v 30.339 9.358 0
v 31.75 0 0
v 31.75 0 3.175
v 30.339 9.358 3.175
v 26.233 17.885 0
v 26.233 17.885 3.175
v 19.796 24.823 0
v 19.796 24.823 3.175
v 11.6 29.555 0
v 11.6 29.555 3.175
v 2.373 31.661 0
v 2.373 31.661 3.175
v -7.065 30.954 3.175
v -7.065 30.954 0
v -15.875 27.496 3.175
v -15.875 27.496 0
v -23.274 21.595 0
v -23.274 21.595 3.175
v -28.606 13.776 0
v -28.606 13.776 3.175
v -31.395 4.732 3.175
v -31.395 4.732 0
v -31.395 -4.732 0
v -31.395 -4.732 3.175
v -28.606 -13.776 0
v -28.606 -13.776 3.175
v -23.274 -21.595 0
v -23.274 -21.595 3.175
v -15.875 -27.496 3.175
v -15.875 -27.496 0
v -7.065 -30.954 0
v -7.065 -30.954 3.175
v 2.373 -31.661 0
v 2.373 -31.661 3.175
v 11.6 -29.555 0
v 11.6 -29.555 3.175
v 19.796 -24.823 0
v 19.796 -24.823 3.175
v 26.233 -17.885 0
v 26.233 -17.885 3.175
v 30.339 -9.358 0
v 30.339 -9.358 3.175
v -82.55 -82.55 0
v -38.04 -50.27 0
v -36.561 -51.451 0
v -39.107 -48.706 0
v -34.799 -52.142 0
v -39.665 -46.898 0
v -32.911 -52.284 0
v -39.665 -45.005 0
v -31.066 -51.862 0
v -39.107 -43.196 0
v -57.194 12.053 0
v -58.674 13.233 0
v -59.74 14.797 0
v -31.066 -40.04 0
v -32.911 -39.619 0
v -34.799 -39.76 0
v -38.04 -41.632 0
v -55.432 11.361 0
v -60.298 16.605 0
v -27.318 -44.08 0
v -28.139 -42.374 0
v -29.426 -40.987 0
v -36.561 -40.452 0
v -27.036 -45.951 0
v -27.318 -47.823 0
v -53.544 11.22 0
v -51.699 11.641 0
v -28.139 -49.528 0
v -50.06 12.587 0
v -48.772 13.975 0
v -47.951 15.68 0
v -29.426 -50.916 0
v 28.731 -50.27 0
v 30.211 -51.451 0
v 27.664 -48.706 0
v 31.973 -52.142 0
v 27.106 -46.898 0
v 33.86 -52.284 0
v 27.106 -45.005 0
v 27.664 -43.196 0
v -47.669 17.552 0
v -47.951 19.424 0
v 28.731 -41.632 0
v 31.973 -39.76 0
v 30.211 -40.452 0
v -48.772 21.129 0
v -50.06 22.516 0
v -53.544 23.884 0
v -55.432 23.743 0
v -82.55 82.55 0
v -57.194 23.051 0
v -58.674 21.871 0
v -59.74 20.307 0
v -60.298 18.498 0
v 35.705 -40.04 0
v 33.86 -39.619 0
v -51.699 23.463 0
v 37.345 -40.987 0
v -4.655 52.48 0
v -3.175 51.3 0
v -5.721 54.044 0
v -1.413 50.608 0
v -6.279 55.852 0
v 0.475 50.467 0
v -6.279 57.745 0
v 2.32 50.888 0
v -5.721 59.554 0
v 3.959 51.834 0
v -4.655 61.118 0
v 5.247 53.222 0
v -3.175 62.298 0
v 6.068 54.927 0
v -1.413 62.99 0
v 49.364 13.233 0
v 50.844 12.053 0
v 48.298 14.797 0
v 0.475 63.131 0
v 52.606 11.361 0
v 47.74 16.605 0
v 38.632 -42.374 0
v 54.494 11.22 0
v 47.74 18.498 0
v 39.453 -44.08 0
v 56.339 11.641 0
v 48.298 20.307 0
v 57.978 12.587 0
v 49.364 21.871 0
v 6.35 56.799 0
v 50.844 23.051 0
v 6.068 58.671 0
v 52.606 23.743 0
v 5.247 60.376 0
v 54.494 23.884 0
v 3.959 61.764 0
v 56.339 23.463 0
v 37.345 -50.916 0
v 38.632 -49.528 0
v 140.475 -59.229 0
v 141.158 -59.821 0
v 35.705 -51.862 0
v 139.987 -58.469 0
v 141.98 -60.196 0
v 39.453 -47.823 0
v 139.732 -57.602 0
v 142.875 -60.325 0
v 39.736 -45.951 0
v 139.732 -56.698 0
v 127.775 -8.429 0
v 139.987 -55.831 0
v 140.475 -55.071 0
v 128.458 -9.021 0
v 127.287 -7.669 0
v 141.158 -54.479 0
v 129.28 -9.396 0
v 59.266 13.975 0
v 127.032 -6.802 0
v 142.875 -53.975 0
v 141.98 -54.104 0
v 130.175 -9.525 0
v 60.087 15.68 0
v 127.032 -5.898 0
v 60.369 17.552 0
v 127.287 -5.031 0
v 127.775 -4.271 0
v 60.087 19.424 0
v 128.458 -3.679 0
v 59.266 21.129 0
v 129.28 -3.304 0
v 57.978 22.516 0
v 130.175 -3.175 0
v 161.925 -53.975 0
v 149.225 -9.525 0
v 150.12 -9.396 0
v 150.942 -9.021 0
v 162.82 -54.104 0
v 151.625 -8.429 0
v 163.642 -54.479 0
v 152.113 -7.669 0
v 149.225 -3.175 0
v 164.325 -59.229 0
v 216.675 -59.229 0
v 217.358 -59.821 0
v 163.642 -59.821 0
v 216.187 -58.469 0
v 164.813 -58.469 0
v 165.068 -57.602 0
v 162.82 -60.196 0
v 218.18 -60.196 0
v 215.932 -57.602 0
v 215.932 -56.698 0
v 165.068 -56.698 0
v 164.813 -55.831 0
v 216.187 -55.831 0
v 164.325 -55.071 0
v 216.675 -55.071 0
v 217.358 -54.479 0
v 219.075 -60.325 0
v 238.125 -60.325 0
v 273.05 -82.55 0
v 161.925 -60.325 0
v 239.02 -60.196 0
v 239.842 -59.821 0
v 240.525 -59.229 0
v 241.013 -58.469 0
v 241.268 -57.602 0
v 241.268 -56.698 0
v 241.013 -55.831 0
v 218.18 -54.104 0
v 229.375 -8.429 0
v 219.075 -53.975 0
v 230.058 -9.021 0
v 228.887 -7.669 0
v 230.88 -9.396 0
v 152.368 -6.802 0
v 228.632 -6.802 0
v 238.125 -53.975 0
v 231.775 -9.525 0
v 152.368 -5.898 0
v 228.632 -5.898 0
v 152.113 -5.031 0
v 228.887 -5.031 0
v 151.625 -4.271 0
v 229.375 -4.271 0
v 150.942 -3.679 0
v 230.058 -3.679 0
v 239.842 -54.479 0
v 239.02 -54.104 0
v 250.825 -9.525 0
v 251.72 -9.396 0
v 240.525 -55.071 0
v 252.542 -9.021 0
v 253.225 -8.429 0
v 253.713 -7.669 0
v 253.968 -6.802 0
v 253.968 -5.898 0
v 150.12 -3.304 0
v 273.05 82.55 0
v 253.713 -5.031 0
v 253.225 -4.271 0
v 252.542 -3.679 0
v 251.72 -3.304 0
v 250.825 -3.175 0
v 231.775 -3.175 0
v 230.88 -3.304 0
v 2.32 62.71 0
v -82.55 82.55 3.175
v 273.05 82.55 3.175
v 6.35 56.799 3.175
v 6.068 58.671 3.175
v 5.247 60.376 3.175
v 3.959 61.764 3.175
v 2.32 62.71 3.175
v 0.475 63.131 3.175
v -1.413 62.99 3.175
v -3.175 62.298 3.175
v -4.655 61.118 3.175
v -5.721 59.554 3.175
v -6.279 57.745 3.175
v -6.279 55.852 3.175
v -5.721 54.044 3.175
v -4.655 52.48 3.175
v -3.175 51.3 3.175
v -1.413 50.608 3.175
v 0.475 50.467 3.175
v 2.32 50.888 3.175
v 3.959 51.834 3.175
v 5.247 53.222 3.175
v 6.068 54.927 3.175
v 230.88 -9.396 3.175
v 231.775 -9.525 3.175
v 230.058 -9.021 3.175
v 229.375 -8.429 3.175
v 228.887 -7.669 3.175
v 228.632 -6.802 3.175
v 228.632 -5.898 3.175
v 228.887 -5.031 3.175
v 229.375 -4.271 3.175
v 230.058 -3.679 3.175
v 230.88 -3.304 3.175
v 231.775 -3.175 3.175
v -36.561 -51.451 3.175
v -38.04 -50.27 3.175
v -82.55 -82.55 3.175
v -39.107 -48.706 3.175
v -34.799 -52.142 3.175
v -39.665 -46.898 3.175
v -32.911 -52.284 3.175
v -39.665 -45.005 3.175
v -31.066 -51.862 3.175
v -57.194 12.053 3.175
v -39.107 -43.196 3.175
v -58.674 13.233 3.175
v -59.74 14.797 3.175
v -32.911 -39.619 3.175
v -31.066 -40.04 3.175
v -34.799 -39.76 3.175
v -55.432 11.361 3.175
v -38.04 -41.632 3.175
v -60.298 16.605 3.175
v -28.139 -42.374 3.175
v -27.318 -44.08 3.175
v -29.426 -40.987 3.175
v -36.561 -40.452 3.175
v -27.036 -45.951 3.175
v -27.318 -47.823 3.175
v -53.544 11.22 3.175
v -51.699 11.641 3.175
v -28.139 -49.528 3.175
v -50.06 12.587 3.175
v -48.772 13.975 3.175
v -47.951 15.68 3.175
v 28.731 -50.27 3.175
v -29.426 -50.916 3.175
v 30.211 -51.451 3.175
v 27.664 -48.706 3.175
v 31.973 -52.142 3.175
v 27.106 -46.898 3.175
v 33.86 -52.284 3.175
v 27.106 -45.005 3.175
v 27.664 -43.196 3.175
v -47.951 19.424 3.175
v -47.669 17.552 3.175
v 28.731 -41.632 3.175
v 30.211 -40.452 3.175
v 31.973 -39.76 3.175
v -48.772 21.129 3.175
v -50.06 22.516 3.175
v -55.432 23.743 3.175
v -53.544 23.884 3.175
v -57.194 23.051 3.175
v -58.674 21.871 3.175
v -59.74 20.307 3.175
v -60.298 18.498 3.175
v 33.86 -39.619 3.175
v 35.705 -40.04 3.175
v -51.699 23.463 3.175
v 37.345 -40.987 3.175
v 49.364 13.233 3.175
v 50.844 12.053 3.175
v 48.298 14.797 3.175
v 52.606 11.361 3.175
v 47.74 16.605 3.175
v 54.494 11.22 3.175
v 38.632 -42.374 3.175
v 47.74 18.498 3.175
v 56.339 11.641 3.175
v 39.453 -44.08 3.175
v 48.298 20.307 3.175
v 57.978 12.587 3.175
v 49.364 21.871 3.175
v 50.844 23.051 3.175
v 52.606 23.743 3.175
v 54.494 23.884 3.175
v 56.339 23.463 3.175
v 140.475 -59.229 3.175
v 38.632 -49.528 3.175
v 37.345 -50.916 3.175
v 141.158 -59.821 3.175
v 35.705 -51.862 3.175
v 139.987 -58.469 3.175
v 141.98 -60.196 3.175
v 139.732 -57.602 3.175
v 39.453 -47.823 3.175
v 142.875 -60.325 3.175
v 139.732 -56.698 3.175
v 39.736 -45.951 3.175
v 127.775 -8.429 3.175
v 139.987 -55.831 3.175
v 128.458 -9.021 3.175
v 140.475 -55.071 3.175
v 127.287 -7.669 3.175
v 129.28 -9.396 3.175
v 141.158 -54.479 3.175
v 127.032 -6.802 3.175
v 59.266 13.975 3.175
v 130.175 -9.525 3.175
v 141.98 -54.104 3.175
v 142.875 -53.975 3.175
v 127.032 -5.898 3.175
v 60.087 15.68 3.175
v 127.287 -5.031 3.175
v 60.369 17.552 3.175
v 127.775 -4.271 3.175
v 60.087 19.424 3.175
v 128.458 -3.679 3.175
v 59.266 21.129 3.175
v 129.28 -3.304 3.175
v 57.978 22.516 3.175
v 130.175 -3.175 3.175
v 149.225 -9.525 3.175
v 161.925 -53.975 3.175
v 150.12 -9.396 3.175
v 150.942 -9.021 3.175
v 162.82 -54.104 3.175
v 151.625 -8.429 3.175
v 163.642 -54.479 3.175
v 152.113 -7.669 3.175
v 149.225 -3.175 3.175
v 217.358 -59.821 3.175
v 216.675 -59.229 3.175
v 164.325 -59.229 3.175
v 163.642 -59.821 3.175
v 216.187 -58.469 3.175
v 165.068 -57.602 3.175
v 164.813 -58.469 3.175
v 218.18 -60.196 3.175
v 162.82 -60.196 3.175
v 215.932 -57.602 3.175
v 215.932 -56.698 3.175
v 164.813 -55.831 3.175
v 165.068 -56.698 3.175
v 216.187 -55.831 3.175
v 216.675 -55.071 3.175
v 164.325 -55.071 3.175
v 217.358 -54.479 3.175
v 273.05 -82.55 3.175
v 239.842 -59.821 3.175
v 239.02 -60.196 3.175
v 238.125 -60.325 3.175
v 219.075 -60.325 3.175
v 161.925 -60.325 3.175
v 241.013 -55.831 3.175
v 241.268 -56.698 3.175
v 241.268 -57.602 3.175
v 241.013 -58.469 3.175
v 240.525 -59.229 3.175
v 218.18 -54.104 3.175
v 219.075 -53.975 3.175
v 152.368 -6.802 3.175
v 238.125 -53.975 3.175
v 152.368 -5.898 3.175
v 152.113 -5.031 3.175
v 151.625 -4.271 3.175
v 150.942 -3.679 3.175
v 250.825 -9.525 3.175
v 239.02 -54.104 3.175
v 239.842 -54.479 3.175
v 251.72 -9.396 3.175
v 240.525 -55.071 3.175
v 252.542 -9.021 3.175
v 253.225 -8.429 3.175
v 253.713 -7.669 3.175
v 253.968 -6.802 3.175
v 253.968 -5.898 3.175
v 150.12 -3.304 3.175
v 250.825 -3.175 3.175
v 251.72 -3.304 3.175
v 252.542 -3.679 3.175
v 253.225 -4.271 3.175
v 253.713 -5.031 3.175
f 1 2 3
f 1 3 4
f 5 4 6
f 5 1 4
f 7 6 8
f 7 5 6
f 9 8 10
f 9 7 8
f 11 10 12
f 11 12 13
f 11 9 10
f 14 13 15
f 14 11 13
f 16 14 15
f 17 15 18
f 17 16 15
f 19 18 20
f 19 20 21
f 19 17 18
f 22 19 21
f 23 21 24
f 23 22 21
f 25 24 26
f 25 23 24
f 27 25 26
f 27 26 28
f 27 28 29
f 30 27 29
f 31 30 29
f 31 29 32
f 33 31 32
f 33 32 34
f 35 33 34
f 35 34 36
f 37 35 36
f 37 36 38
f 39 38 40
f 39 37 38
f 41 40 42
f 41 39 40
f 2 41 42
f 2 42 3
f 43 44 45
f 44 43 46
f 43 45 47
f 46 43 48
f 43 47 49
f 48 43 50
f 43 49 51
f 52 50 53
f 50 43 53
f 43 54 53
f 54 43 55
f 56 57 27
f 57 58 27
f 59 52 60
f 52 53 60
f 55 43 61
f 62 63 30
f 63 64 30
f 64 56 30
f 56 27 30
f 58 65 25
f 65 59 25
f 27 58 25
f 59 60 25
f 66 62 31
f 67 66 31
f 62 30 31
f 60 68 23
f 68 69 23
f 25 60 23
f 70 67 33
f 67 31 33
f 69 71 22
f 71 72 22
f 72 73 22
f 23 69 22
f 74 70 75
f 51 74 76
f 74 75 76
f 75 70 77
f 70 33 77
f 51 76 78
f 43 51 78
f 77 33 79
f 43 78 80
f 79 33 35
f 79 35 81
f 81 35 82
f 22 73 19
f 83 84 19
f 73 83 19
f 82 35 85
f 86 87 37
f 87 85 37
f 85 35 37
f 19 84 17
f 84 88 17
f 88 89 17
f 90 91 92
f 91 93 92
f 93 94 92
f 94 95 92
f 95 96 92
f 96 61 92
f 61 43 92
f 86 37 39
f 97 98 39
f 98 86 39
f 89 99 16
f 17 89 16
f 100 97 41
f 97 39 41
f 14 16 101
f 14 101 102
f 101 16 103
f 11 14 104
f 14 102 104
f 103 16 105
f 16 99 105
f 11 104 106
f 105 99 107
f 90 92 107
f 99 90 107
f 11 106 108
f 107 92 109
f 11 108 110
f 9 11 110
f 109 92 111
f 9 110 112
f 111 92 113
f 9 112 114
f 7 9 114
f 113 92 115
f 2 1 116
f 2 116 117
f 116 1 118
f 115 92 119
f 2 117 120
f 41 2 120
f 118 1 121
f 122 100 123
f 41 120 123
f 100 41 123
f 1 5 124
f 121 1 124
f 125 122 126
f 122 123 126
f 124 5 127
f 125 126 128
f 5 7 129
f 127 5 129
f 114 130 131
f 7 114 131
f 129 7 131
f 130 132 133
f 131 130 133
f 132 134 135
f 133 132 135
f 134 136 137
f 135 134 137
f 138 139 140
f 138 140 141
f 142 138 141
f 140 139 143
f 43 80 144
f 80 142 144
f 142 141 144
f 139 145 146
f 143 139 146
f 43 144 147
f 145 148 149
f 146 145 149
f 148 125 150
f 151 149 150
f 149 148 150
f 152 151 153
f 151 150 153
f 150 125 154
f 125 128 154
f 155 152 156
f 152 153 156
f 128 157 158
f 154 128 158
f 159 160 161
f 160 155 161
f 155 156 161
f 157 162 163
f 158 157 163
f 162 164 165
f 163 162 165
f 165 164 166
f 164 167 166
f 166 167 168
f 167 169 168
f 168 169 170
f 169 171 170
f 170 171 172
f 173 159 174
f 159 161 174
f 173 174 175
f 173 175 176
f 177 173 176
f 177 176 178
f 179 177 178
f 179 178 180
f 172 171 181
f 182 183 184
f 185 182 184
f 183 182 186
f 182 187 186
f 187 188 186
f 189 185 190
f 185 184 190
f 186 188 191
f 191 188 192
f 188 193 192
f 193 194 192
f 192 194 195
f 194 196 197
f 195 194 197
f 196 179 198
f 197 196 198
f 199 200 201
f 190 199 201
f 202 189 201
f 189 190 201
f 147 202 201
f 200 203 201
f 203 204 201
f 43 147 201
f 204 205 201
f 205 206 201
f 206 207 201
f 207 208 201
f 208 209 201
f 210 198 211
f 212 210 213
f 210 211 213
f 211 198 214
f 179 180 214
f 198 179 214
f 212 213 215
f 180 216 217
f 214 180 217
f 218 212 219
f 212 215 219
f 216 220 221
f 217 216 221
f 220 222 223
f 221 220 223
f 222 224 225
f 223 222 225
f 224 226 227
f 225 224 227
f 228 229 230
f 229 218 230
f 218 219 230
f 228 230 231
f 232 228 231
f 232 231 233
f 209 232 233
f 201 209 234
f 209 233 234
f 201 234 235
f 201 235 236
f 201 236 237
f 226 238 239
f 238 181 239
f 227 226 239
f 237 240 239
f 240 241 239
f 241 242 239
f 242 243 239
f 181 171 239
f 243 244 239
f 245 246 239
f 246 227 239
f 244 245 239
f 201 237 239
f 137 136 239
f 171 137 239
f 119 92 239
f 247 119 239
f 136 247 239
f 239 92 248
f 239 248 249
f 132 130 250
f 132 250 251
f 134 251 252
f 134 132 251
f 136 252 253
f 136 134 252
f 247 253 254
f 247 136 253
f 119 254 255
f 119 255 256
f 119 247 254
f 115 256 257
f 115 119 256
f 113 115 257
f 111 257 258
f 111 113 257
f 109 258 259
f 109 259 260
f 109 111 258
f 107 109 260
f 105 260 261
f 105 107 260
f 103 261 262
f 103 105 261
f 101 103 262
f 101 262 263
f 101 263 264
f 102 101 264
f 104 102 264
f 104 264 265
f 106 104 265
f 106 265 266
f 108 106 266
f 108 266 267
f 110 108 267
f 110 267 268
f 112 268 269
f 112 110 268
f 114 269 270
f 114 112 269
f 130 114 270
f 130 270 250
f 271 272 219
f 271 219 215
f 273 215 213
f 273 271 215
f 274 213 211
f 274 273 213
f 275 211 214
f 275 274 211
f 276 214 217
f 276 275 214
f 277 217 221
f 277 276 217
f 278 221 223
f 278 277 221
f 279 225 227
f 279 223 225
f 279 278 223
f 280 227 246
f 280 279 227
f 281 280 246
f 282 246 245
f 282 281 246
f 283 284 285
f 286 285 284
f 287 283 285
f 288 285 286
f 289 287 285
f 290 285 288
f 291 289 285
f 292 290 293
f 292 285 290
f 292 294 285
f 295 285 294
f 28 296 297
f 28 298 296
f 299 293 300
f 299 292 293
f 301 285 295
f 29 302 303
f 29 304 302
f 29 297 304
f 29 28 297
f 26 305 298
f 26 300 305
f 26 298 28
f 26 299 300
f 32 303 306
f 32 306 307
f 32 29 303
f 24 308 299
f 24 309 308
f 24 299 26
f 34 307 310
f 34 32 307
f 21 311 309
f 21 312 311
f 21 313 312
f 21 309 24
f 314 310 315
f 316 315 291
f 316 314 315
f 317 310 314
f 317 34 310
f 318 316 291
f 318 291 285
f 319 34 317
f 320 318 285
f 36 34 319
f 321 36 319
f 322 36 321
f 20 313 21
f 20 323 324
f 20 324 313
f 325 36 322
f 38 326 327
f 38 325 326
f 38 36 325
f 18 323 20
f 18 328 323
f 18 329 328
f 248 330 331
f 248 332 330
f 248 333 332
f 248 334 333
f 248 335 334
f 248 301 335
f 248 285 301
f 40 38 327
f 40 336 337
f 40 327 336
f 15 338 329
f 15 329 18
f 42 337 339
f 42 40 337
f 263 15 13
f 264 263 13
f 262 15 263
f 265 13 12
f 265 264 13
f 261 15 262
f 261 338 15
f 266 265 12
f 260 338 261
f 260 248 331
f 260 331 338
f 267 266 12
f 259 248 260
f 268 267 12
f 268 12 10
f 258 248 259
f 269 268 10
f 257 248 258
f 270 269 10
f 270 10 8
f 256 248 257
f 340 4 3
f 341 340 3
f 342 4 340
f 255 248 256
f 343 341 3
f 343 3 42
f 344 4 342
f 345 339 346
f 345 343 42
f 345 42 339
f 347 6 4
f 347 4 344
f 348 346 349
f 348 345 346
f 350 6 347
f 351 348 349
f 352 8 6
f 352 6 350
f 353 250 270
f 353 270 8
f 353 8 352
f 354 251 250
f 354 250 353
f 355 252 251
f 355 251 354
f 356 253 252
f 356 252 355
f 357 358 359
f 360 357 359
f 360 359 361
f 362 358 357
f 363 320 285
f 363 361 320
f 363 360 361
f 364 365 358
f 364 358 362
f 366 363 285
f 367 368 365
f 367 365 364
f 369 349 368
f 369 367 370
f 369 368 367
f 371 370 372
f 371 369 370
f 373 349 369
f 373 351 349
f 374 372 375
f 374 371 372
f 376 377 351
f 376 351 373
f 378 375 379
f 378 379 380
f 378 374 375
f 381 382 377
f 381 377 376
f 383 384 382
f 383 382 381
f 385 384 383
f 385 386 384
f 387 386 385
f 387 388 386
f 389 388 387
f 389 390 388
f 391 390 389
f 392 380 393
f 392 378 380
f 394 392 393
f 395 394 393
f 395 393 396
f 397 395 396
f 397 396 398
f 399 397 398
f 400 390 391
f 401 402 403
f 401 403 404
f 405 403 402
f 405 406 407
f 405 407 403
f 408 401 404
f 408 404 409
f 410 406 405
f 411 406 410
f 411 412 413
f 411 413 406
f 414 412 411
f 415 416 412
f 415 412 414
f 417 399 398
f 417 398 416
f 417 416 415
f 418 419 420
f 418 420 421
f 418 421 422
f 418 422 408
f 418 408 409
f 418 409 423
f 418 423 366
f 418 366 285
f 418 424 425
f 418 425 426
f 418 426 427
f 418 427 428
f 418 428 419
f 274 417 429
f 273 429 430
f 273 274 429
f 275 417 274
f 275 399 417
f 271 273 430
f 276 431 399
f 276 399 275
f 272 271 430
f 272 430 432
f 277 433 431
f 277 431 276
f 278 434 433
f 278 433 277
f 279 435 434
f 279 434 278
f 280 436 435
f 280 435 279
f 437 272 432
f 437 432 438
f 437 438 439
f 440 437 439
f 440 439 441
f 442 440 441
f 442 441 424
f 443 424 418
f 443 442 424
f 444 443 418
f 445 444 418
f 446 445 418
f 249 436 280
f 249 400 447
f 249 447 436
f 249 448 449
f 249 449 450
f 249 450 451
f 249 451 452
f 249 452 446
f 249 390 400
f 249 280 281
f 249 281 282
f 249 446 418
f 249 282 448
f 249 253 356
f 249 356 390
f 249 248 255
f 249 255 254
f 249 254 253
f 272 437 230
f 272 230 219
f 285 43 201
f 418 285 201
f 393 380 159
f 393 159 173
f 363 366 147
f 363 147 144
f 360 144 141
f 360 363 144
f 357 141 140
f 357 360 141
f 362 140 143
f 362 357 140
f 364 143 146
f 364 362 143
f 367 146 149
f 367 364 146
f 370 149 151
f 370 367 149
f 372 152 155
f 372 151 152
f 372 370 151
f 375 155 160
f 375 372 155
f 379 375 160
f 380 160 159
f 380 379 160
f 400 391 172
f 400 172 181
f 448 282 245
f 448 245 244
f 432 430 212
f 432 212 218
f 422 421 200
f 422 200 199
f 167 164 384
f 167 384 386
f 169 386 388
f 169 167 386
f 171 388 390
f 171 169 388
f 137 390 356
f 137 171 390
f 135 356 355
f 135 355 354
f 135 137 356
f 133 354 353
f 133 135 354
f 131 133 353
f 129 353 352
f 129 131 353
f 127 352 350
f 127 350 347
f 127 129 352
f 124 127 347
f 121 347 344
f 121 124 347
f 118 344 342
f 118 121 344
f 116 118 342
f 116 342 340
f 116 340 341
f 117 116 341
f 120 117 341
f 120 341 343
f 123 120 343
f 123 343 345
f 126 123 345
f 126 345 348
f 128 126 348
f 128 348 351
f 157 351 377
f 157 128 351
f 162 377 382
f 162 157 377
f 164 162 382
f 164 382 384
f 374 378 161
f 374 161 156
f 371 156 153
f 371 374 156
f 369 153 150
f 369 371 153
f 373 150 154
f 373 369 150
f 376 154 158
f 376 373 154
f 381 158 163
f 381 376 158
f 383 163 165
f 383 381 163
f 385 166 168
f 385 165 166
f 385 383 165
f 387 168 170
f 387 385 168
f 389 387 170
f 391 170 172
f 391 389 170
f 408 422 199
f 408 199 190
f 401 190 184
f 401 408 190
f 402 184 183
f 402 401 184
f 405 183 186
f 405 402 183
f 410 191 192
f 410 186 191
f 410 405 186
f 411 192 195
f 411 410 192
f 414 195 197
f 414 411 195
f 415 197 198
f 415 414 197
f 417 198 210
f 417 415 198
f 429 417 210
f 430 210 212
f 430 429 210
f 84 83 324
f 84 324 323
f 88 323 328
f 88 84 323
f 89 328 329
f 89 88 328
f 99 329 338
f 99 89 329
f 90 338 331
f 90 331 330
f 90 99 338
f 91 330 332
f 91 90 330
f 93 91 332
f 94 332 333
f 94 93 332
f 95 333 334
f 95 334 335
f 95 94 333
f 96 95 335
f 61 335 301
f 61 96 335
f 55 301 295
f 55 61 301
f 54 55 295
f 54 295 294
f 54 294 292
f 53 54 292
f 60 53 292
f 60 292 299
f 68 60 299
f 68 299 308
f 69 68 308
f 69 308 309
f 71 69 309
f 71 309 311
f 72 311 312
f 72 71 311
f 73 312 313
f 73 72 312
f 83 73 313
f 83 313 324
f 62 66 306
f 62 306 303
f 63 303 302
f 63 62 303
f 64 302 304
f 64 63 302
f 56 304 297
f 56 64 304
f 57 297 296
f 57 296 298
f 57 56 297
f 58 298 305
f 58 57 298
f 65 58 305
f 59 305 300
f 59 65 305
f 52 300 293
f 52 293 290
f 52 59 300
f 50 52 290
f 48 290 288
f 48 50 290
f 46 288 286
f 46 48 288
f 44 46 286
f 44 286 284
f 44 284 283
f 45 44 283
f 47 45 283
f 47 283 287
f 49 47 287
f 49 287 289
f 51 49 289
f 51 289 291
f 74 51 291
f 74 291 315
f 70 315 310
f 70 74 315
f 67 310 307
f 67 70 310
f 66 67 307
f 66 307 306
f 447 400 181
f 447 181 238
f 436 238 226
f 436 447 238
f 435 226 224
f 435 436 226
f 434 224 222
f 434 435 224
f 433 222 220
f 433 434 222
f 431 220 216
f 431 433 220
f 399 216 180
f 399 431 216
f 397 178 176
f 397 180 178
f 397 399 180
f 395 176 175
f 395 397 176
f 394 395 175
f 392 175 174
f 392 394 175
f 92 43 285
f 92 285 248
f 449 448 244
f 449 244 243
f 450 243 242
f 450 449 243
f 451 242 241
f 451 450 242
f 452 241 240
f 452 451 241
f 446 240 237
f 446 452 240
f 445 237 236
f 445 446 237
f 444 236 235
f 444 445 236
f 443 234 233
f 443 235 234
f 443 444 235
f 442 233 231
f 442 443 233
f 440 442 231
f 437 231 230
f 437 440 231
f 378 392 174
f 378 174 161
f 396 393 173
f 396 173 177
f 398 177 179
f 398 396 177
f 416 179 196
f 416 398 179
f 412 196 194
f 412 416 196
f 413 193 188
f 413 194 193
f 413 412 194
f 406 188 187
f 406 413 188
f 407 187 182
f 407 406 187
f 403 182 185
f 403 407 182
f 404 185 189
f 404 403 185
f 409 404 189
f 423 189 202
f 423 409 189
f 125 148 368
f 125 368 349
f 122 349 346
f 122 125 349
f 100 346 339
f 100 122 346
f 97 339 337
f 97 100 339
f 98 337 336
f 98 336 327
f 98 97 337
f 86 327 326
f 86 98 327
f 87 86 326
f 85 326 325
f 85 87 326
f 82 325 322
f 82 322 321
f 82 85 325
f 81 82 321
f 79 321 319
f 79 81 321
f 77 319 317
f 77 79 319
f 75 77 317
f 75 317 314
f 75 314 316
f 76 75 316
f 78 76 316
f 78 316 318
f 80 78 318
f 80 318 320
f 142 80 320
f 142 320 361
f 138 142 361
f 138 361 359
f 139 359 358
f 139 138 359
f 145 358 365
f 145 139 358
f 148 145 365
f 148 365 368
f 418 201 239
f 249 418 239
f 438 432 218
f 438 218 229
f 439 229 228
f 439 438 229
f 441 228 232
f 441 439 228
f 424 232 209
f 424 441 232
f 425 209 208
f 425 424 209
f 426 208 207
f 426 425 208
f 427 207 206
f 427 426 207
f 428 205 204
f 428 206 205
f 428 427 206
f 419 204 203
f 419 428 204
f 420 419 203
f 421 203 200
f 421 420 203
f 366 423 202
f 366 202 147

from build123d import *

# Parameters (mm, degrees)
SKETCH2_W           = 355.6
SKETCH2_H           = 165.1
SKETCH2_R           = 31.75
SKETCH2_R_2         = 6.35
BOSS_EXTRUDE1_DEPTH = 3.175
CUT_EXTRUDE1_DEPTH  = 4.175


with BuildPart() as part:
    # Sketch2 → Boss-Extrude1 (new body)
    with BuildSketch(Plane.XY):
        with Locations((95.25, 0)):
            Rectangle(SKETCH2_W, SKETCH2_H)
        Circle(SKETCH2_R, mode=Mode.SUBTRACT)
        with Locations((-54.018973032, 17.551828308)):
            Circle(SKETCH2_R_2, mode=Mode.SUBTRACT)
        with Locations((0, 56.798909535)):
            Circle(SKETCH2_R_2, mode=Mode.SUBTRACT)
        with Locations((54.018973032, 17.551828308)):
            Circle(SKETCH2_R_2, mode=Mode.SUBTRACT)
        with Locations((33.385561371, -45.951283076)):
            Circle(SKETCH2_R_2, mode=Mode.SUBTRACT)
        with Locations((-33.385561371, -45.951283076)):
            Circle(SKETCH2_R_2, mode=Mode.SUBTRACT)
    extrude(amount=BOSS_EXTRUDE1_DEPTH)

    # Sketch3 → Cut-Extrude1 (cut, through all)
    with BuildSketch(Plane.XY.offset(3.175)):
        with BuildLine():
            Line((149.225, -9.525), (130.175, -9.525))
            ThreePointArc((130.175, -9.525), (127, -6.35), (130.175, -3.175))
            Line((130.175, -3.175), (149.225, -3.175))
            ThreePointArc((149.225, -3.175), (152.4, -6.35), (149.225, -9.525))
        make_face()
        with BuildLine():
            Line((250.825, -9.525), (231.775, -9.525))
            ThreePointArc((231.775, -9.525), (228.6, -6.35), (231.775, -3.175))
            Line((231.775, -3.175), (250.825, -3.175))
            ThreePointArc((250.825, -3.175), (254, -6.35), (250.825, -9.525))
        make_face()
        with BuildLine():
            Line((238.125, -60.325), (219.075, -60.325))
            ThreePointArc((219.075, -60.325), (215.9, -57.15), (219.075, -53.975))
            Line((219.075, -53.975), (238.125, -53.975))
            ThreePointArc((238.125, -53.975), (241.3, -57.15), (238.125, -60.325))
        make_face()
        with BuildLine():
            Line((142.875, -53.975), (161.925, -53.975))
            ThreePointArc((161.925, -53.975), (165.1, -57.15), (161.925, -60.325))
            Line((161.925, -60.325), (142.875, -60.325))
            ThreePointArc((142.875, -60.325), (139.7, -57.15), (142.875, -53.975))
        make_face()
    extrude(amount=-CUT_EXTRUDE1_DEPTH, mode=Mode.SUBTRACT)


solid = part.part
